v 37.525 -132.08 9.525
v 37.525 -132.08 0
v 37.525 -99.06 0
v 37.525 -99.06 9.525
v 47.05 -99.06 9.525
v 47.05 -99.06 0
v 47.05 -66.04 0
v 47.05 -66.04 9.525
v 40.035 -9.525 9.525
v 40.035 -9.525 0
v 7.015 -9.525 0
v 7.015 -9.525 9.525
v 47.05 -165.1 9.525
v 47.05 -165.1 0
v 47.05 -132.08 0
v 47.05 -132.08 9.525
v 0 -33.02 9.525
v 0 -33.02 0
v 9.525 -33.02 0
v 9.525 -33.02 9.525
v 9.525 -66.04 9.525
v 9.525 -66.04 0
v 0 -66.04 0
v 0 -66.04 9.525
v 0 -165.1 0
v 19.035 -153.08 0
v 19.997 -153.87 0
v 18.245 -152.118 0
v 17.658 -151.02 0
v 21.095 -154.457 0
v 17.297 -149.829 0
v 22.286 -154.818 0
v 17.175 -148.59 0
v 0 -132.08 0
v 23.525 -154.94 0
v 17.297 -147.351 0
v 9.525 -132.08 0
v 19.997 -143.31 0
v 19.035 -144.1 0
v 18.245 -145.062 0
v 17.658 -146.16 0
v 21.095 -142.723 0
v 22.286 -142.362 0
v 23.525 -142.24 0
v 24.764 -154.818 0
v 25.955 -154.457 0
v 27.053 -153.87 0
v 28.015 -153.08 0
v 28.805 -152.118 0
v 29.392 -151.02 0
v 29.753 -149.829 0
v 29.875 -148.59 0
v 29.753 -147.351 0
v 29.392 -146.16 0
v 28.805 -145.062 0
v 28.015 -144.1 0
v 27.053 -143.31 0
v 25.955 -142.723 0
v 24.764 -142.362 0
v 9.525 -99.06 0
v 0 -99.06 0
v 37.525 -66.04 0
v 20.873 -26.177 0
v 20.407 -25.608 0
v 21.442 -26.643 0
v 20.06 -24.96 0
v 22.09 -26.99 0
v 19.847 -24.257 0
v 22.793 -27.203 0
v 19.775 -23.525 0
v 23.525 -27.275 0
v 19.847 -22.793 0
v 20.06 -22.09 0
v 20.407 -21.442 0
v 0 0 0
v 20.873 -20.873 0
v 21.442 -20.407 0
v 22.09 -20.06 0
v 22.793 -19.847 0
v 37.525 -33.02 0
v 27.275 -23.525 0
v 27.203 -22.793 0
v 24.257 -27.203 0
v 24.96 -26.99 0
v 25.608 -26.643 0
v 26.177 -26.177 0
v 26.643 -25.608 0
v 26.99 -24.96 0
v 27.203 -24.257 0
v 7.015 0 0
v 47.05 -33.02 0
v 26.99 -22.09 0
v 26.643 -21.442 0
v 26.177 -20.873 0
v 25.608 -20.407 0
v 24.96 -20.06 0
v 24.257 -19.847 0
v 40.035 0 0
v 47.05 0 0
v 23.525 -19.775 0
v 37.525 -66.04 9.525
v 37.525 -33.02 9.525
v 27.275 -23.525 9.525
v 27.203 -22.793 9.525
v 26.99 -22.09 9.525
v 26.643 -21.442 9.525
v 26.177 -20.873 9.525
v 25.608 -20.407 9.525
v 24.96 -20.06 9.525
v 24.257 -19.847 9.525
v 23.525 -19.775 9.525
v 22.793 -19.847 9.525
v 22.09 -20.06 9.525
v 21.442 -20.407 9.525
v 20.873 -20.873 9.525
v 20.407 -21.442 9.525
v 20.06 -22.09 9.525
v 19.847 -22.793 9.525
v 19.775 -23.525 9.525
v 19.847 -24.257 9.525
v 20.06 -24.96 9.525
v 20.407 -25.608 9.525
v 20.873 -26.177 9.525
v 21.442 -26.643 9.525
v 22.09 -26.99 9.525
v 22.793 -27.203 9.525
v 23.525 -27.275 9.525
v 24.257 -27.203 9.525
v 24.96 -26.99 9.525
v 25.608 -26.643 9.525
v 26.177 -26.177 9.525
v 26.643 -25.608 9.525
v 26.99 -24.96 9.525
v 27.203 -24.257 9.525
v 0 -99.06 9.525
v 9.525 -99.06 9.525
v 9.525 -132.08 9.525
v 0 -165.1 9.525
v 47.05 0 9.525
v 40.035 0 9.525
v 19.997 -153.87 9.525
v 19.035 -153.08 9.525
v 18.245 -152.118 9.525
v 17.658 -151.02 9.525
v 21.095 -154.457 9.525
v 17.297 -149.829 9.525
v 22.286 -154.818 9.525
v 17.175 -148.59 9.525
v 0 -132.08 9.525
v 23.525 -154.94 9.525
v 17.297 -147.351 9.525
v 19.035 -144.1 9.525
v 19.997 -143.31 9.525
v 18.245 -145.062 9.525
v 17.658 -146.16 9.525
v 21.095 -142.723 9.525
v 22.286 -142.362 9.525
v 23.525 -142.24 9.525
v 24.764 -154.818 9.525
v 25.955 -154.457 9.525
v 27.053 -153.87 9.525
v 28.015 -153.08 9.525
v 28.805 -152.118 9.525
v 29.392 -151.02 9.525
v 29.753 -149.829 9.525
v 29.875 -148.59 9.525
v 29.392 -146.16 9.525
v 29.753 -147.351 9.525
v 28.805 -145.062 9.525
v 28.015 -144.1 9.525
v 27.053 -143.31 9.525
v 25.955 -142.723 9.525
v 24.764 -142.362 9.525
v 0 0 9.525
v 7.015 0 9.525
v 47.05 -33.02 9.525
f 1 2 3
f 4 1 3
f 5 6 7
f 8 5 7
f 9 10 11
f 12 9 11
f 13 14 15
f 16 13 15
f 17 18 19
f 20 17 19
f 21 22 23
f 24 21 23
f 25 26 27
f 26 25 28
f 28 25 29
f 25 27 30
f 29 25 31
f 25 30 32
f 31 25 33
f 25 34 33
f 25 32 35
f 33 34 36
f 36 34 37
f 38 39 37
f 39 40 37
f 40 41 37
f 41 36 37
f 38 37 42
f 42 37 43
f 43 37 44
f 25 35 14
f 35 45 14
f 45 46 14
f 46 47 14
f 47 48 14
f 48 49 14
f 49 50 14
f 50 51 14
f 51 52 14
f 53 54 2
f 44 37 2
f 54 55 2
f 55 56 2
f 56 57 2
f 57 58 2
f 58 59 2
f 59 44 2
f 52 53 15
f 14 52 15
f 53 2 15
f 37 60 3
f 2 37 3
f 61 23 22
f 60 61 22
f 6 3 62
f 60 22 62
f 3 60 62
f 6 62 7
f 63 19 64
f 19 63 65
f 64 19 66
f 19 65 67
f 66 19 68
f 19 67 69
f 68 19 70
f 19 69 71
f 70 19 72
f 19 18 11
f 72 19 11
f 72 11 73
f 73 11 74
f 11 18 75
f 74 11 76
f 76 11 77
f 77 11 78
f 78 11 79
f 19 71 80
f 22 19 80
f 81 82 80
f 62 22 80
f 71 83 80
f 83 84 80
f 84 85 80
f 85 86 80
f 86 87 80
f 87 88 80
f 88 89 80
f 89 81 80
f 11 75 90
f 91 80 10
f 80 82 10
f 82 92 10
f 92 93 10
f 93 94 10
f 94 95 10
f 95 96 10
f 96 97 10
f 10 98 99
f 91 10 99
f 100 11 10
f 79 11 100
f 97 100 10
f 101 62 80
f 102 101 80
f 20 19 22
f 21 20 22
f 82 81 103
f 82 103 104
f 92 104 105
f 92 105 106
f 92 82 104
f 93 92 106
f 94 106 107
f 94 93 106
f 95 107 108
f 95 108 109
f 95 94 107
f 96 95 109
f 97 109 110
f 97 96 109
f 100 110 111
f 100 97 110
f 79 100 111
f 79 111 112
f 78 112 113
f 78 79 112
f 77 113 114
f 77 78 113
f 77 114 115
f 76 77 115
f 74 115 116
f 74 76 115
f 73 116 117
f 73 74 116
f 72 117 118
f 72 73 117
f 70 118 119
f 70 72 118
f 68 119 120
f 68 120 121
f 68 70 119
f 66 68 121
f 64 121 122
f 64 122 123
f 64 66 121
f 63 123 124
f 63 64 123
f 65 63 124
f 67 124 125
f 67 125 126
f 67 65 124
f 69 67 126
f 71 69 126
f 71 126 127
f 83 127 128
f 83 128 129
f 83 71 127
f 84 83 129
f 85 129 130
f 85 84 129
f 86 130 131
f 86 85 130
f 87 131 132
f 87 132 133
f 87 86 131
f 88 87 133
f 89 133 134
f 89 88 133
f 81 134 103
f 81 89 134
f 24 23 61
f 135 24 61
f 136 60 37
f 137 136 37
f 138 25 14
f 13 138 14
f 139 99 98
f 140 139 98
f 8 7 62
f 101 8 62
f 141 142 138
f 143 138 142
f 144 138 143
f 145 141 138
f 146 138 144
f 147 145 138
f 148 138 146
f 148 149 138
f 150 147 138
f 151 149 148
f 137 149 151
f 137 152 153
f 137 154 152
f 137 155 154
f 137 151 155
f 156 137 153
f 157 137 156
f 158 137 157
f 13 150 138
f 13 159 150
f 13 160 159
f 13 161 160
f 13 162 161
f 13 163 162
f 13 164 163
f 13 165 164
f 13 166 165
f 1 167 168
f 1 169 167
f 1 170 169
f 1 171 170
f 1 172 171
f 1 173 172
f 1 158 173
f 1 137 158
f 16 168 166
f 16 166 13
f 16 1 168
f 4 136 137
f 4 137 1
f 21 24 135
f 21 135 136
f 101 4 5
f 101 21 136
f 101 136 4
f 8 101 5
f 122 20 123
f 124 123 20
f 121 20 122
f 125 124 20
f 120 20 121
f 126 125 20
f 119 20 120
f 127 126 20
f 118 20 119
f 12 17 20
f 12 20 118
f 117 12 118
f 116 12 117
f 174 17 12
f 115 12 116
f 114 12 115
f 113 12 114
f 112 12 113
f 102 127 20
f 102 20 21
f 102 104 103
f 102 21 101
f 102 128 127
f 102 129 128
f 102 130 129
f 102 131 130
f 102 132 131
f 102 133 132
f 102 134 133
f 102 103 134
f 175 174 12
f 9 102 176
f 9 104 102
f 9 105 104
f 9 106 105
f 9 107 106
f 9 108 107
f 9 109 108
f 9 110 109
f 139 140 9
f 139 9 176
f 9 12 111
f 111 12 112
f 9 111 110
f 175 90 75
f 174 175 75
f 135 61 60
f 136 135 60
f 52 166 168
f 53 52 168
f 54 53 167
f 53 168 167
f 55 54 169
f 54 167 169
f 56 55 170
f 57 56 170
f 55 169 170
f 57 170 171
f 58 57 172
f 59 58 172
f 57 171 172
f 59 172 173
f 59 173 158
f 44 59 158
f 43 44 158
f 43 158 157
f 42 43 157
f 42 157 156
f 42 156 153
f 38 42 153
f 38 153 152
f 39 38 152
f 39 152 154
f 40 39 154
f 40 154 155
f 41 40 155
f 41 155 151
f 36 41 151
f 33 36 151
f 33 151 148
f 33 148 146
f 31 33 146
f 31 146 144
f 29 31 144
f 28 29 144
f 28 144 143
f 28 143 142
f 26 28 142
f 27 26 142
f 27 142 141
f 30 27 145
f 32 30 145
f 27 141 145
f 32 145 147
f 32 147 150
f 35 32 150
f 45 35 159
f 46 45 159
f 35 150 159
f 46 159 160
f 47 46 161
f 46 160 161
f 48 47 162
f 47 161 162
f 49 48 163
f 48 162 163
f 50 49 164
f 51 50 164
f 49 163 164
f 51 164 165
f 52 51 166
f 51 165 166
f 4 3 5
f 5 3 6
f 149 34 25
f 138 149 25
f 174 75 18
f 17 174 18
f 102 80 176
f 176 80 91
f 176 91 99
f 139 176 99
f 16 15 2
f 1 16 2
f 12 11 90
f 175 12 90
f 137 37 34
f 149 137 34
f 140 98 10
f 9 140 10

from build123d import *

# Parameters (mm, degrees)
SKETCH1_R           = 3.75
BOSS_EXTRUDE1_DEPTH = 9.525
SKETCH2_R           = 6.35
CUT_EXTRUDE1_DEPTH  = 10.525


with BuildPart() as part:
    # Sketch1 → Boss-Extrude1 (new body)
    with BuildSketch(Plane.XY):
        Polygon((40.03500006, -9.525), (7.01500006, -9.525), (7.01500006, 0), (0, 0), (0, -33.02), (9.525, -33.02), (9.525, -66.04), (0, -66.04), (0, -99.06), (9.525, -99.06), (9.525, -132.08), (0, -132.08), (0, -165.1), (47.05000012, -165.1), (47.05000012, -132.08), (37.52500012, -132.08), (37.52500012, -99.06), (47.05000012, -99.06), (47.05000012, -66.04), (37.52500012, -66.04), (37.52500012, -33.02), (47.05000012, -33.02), (47.05000012, 0), (40.03500006, 0), align=None)
        with Locations((23.52500006, -23.525)):
            Circle(SKETCH1_R, mode=Mode.SUBTRACT)
    extrude(amount=BOSS_EXTRUDE1_DEPTH)

    # Sketch2 → Cut-Extrude1 (cut, through all)
    with BuildSketch(Plane.XY.offset(9.525)):
        with Locations((23.52500006, -148.59)):
            Circle(SKETCH2_R)
    extrude(amount=-CUT_EXTRUDE1_DEPTH, mode=Mode.SUBTRACT)


solid = part.part
